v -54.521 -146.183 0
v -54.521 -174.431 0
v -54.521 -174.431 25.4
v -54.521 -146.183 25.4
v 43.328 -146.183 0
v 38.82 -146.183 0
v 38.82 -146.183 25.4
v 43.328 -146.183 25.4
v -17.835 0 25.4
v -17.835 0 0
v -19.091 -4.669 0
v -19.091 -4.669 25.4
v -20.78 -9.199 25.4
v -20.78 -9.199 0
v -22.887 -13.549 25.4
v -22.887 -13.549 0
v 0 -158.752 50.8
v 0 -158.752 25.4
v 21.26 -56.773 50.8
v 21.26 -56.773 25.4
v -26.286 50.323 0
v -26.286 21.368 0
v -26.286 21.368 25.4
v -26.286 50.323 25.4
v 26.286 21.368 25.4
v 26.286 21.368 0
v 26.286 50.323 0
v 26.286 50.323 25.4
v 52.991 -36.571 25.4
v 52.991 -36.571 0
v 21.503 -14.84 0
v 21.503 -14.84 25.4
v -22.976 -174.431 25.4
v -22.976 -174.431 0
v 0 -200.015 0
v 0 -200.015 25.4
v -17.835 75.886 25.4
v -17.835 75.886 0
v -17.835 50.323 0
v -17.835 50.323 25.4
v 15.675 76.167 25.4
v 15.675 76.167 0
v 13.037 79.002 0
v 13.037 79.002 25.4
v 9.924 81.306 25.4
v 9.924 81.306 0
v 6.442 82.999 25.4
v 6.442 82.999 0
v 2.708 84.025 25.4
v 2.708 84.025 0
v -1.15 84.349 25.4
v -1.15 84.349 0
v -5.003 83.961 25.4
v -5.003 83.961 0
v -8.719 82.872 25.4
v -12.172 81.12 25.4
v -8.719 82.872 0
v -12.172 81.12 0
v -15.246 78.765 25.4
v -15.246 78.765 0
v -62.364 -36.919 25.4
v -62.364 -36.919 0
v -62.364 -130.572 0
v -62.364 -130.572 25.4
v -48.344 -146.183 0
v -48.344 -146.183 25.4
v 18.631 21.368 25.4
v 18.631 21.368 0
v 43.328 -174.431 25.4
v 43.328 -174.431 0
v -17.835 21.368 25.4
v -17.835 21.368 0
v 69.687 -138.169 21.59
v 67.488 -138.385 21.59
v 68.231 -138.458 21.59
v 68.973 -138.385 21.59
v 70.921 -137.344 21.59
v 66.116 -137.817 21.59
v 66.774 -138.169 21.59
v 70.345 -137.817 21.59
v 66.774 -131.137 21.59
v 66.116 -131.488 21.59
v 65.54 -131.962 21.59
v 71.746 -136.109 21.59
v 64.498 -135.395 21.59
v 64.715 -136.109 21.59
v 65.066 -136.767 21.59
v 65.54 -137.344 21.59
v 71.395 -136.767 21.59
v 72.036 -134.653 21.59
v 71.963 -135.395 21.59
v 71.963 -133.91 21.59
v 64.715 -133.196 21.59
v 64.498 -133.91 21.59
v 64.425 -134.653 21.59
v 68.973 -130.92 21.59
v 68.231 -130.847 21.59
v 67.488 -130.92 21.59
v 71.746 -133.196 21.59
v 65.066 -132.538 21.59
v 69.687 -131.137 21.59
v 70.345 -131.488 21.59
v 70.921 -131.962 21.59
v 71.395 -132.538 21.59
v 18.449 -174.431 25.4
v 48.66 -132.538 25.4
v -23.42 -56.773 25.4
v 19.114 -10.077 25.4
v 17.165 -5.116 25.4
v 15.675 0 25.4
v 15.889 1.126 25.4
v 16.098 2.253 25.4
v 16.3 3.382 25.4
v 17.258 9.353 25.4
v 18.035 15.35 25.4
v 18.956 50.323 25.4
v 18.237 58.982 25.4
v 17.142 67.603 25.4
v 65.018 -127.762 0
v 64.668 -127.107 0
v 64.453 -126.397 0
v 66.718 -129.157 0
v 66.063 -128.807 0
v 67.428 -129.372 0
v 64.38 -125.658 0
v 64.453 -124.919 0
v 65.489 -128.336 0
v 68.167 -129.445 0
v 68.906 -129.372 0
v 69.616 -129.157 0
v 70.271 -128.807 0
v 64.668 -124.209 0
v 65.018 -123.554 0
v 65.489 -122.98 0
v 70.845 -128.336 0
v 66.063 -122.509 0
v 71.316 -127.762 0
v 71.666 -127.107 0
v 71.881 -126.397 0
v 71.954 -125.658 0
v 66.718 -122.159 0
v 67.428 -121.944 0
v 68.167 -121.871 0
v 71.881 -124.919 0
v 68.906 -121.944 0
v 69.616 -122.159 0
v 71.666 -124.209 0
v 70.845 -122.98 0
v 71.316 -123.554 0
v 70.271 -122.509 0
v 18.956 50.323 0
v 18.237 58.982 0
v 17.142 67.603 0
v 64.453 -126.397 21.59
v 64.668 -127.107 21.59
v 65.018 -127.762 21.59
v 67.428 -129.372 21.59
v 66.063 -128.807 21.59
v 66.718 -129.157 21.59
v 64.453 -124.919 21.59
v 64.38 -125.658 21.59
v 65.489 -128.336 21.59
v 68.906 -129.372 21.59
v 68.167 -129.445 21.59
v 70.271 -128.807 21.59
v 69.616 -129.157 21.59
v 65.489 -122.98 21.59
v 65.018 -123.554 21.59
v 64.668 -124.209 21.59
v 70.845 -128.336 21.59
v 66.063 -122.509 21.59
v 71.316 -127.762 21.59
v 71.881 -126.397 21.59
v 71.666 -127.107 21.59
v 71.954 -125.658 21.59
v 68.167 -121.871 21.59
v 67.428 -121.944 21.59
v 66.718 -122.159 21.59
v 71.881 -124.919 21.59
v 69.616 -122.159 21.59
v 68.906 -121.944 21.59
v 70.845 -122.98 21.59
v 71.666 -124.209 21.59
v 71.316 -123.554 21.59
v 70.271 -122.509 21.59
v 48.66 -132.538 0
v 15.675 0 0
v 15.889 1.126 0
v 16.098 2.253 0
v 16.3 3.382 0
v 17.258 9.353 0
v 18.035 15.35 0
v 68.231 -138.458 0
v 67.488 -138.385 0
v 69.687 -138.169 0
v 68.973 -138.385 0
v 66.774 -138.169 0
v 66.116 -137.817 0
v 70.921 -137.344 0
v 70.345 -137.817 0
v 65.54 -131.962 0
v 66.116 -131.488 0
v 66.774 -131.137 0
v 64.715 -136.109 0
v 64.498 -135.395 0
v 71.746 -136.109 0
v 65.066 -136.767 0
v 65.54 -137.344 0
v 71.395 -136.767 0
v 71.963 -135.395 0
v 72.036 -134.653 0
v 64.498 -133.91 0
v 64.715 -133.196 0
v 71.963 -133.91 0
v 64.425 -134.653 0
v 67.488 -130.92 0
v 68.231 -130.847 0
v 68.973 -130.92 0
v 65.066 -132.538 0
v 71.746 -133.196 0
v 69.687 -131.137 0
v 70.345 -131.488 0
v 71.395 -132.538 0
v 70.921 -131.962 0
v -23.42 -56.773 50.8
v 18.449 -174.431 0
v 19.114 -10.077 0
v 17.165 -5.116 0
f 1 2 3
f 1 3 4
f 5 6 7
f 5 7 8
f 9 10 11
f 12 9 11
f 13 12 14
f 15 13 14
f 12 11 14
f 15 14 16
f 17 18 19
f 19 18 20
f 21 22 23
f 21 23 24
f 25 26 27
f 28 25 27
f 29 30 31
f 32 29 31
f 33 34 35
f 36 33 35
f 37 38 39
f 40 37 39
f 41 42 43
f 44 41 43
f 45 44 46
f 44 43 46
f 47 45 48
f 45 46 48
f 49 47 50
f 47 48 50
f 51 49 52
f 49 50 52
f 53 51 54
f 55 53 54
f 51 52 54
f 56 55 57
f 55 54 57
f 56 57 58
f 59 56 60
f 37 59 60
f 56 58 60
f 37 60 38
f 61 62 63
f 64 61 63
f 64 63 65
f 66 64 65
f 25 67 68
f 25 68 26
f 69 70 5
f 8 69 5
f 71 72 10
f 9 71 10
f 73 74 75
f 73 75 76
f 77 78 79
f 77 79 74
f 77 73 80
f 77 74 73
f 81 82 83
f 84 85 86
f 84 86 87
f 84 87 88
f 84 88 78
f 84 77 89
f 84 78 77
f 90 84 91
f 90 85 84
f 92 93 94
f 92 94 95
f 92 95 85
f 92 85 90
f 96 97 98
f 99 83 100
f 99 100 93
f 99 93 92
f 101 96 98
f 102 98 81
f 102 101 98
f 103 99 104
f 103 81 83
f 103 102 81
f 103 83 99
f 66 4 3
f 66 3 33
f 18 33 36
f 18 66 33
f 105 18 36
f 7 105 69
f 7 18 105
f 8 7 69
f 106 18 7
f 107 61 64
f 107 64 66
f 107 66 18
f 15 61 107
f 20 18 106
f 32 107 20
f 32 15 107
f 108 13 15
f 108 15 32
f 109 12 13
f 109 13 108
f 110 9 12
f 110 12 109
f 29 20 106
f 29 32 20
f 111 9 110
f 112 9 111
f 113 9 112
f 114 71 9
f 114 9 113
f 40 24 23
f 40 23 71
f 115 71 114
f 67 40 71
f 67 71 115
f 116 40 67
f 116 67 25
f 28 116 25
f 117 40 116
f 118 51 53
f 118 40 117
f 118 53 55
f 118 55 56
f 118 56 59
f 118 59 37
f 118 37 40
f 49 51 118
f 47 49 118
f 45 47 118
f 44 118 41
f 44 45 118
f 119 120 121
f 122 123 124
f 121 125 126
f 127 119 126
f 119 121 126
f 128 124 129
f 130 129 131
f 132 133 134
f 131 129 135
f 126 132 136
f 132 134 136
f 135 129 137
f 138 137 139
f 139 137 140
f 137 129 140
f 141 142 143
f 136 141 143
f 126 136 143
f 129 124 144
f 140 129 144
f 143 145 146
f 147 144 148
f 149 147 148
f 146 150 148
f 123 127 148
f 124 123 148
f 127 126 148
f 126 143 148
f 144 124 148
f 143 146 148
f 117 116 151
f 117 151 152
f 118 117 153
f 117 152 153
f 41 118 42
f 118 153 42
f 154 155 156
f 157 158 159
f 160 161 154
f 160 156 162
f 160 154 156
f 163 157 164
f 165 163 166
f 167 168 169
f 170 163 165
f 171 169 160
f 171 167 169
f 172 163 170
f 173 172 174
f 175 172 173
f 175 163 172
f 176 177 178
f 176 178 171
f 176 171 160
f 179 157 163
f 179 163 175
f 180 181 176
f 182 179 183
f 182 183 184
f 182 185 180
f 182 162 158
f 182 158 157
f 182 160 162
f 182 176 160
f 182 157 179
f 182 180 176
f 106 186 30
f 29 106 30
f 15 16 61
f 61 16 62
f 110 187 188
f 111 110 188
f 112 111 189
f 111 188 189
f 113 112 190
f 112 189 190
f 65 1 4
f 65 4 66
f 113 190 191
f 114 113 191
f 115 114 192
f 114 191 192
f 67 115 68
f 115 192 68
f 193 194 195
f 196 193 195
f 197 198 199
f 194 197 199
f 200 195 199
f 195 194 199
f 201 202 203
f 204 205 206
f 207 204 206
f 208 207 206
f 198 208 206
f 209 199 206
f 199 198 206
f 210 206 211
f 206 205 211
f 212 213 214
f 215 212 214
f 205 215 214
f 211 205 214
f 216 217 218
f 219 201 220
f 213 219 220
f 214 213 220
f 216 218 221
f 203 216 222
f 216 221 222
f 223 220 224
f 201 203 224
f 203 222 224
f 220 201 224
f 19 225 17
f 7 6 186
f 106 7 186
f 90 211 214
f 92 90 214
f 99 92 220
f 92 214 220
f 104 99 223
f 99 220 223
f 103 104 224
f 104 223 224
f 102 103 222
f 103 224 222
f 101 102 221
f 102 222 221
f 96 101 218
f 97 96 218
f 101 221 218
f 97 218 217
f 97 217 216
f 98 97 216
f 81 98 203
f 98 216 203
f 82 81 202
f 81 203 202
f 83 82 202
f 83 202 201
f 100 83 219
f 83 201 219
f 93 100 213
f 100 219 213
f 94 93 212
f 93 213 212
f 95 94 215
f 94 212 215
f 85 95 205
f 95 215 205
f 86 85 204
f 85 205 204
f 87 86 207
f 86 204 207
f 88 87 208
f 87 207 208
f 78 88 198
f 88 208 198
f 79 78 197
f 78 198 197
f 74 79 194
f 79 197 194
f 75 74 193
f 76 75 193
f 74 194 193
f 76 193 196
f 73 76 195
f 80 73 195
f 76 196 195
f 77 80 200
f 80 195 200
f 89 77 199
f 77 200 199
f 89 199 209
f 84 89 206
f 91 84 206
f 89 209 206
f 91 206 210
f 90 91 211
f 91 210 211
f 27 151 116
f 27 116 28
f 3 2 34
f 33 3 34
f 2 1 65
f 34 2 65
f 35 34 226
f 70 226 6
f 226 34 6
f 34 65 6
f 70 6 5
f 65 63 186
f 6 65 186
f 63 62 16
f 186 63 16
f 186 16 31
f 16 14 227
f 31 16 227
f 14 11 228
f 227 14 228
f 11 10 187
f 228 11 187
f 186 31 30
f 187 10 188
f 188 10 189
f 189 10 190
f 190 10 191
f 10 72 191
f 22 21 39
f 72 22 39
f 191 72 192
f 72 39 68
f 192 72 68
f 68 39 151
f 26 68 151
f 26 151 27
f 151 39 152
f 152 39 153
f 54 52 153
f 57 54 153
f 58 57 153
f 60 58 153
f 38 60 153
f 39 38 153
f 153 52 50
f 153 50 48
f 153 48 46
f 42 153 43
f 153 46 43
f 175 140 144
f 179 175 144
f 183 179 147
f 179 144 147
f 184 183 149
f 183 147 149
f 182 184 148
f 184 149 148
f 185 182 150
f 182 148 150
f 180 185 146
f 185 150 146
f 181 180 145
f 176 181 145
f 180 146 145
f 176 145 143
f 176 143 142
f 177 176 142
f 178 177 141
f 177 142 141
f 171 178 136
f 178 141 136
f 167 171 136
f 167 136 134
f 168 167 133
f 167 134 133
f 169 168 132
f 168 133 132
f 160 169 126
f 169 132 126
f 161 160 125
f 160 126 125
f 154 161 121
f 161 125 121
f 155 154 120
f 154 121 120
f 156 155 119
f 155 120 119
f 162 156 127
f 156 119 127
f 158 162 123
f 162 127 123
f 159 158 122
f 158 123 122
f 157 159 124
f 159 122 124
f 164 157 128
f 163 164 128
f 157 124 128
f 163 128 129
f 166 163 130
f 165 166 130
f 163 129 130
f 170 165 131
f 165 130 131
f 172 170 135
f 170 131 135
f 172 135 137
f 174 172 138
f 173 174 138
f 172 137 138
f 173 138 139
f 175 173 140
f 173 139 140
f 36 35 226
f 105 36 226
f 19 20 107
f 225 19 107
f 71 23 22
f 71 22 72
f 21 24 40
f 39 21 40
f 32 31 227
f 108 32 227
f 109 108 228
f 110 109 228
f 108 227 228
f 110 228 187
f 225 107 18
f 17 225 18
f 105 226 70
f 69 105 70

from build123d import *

# Parameters (mm, degrees)
F0_DEPTH  = 25.4
F15_DEPTH = 25.4
F6_DEPTH  = 25.4
F7_W      = 52.5711476803
F7_H      = 28.9547294378
F8_DEPTH  = 25.4
F9_R      = 3.7869940918
F10_DEPTH = 21.59
F18_R     = 3.8055561705
F11_DEPTH = 21.59
F19_W     = 97.8483408689
F19_H     = 28.2483398914
F12_DEPTH = 25.4


# Not quite as in the source:
# - the program builds the solid bodies; features that only make, move or delete a surface that nothing else refers to are left out


with BuildPart() as f0:
    # F13 (on Top) → F0 (new body)
    with BuildSketch(Plane.XY):
        with BuildLine():
            ThreePointArc((16.2997245058, 3.3815672953), (19.3231299232, 39.8030258746), (15.6745165586, 76.1671736836))
            ThreePointArc((15.6745165586, 76.1671736836), (-1.1504060771, 84.3494571695), (-17.8354382515, 75.8855640888))
            Line((-17.8354382515, 75.8855640888), (-17.8354382515, 0))
            ThreePointArc((-17.8354382515, 0), (-29.0742141651, -22.5080976821), (-49.6557429433, -36.9761735201))
            ThreePointArc((-49.6557429433, -36.9761735201), (-53.2002321262, -80.6407257915), (-49.6557429433, -124.3052780628))
            ThreePointArc((-49.6557429433, -124.3052780628), (-28.552755811, -158.7517318324), (0, -187.3285472393))
            ThreePointArc((0, -187.3285472393), (23.5369802762, -157.5088719546), (41.433095932, -123.9987015724))
            ThreePointArc((41.433095932, -123.9987015724), (43.4568628888, -79.9188986421), (41.433095932, -35.8390957117))
            ThreePointArc((41.433095932, -35.8390957117), (25.0609068527, -20.4299941844), (15.6745165586, 0))
            ThreePointArc((15.6745165586, 0), (15.9943820769, 1.6894410822), (16.2997245058, 3.3815672953))
        make_face()
    extrude(amount=F0_DEPTH)

    # F14 (on face) → F15 (join)
    with BuildSketch(Plane.XY.offset(25.4)):
        Polygon((21.2603222236, -56.7732304335), (-23.4202891588, -56.7732304335), (0, -158.7517318324), align=None)
    extrude(amount=F15_DEPTH)

    # F5 (on Top) → F6 (join)
    with BuildSketch(Plane.XY):
        Polygon((0, 0), (-62.3636394739, -36.9194597006), (-62.3636394739, -130.5717527866), (0, -200.0146508217), (48.659875989, -132.5382590294), (52.991092205, -36.5707874298), align=None)
    extrude(amount=F6_DEPTH)

    # F7 (on Top) → F8 (join)
    with BuildSketch(Plane.XY):
        with Locations((0, 35.8452573419)):
            Rectangle(F7_W, F7_H)
    extrude(amount=F8_DEPTH)

    # F19 (on Top) → F12 (join)
    with BuildSketch(Plane.XY):
        with Locations((-5.5963620543, -160.3068858385)):
            Rectangle(F19_W, F19_H)
    extrude(amount=F12_DEPTH)


with BuildPart() as f10:
    # F9 (on Top) → F10 (new body)
    with BuildSketch(Plane.XY):
        with Locations((68.1670159101, -125.6581246853)):
            Circle(F9_R)
    extrude(amount=F10_DEPTH)


with BuildPart() as f11:
    # F18 (on Top) → F11 (new body)
    with BuildSketch(Plane.XY):
        with Locations((68.230509758, -134.652659297)):
            Circle(F18_R)
    extrude(amount=F11_DEPTH)


solid = Compound([f0.part, f10.part, f11.part])
